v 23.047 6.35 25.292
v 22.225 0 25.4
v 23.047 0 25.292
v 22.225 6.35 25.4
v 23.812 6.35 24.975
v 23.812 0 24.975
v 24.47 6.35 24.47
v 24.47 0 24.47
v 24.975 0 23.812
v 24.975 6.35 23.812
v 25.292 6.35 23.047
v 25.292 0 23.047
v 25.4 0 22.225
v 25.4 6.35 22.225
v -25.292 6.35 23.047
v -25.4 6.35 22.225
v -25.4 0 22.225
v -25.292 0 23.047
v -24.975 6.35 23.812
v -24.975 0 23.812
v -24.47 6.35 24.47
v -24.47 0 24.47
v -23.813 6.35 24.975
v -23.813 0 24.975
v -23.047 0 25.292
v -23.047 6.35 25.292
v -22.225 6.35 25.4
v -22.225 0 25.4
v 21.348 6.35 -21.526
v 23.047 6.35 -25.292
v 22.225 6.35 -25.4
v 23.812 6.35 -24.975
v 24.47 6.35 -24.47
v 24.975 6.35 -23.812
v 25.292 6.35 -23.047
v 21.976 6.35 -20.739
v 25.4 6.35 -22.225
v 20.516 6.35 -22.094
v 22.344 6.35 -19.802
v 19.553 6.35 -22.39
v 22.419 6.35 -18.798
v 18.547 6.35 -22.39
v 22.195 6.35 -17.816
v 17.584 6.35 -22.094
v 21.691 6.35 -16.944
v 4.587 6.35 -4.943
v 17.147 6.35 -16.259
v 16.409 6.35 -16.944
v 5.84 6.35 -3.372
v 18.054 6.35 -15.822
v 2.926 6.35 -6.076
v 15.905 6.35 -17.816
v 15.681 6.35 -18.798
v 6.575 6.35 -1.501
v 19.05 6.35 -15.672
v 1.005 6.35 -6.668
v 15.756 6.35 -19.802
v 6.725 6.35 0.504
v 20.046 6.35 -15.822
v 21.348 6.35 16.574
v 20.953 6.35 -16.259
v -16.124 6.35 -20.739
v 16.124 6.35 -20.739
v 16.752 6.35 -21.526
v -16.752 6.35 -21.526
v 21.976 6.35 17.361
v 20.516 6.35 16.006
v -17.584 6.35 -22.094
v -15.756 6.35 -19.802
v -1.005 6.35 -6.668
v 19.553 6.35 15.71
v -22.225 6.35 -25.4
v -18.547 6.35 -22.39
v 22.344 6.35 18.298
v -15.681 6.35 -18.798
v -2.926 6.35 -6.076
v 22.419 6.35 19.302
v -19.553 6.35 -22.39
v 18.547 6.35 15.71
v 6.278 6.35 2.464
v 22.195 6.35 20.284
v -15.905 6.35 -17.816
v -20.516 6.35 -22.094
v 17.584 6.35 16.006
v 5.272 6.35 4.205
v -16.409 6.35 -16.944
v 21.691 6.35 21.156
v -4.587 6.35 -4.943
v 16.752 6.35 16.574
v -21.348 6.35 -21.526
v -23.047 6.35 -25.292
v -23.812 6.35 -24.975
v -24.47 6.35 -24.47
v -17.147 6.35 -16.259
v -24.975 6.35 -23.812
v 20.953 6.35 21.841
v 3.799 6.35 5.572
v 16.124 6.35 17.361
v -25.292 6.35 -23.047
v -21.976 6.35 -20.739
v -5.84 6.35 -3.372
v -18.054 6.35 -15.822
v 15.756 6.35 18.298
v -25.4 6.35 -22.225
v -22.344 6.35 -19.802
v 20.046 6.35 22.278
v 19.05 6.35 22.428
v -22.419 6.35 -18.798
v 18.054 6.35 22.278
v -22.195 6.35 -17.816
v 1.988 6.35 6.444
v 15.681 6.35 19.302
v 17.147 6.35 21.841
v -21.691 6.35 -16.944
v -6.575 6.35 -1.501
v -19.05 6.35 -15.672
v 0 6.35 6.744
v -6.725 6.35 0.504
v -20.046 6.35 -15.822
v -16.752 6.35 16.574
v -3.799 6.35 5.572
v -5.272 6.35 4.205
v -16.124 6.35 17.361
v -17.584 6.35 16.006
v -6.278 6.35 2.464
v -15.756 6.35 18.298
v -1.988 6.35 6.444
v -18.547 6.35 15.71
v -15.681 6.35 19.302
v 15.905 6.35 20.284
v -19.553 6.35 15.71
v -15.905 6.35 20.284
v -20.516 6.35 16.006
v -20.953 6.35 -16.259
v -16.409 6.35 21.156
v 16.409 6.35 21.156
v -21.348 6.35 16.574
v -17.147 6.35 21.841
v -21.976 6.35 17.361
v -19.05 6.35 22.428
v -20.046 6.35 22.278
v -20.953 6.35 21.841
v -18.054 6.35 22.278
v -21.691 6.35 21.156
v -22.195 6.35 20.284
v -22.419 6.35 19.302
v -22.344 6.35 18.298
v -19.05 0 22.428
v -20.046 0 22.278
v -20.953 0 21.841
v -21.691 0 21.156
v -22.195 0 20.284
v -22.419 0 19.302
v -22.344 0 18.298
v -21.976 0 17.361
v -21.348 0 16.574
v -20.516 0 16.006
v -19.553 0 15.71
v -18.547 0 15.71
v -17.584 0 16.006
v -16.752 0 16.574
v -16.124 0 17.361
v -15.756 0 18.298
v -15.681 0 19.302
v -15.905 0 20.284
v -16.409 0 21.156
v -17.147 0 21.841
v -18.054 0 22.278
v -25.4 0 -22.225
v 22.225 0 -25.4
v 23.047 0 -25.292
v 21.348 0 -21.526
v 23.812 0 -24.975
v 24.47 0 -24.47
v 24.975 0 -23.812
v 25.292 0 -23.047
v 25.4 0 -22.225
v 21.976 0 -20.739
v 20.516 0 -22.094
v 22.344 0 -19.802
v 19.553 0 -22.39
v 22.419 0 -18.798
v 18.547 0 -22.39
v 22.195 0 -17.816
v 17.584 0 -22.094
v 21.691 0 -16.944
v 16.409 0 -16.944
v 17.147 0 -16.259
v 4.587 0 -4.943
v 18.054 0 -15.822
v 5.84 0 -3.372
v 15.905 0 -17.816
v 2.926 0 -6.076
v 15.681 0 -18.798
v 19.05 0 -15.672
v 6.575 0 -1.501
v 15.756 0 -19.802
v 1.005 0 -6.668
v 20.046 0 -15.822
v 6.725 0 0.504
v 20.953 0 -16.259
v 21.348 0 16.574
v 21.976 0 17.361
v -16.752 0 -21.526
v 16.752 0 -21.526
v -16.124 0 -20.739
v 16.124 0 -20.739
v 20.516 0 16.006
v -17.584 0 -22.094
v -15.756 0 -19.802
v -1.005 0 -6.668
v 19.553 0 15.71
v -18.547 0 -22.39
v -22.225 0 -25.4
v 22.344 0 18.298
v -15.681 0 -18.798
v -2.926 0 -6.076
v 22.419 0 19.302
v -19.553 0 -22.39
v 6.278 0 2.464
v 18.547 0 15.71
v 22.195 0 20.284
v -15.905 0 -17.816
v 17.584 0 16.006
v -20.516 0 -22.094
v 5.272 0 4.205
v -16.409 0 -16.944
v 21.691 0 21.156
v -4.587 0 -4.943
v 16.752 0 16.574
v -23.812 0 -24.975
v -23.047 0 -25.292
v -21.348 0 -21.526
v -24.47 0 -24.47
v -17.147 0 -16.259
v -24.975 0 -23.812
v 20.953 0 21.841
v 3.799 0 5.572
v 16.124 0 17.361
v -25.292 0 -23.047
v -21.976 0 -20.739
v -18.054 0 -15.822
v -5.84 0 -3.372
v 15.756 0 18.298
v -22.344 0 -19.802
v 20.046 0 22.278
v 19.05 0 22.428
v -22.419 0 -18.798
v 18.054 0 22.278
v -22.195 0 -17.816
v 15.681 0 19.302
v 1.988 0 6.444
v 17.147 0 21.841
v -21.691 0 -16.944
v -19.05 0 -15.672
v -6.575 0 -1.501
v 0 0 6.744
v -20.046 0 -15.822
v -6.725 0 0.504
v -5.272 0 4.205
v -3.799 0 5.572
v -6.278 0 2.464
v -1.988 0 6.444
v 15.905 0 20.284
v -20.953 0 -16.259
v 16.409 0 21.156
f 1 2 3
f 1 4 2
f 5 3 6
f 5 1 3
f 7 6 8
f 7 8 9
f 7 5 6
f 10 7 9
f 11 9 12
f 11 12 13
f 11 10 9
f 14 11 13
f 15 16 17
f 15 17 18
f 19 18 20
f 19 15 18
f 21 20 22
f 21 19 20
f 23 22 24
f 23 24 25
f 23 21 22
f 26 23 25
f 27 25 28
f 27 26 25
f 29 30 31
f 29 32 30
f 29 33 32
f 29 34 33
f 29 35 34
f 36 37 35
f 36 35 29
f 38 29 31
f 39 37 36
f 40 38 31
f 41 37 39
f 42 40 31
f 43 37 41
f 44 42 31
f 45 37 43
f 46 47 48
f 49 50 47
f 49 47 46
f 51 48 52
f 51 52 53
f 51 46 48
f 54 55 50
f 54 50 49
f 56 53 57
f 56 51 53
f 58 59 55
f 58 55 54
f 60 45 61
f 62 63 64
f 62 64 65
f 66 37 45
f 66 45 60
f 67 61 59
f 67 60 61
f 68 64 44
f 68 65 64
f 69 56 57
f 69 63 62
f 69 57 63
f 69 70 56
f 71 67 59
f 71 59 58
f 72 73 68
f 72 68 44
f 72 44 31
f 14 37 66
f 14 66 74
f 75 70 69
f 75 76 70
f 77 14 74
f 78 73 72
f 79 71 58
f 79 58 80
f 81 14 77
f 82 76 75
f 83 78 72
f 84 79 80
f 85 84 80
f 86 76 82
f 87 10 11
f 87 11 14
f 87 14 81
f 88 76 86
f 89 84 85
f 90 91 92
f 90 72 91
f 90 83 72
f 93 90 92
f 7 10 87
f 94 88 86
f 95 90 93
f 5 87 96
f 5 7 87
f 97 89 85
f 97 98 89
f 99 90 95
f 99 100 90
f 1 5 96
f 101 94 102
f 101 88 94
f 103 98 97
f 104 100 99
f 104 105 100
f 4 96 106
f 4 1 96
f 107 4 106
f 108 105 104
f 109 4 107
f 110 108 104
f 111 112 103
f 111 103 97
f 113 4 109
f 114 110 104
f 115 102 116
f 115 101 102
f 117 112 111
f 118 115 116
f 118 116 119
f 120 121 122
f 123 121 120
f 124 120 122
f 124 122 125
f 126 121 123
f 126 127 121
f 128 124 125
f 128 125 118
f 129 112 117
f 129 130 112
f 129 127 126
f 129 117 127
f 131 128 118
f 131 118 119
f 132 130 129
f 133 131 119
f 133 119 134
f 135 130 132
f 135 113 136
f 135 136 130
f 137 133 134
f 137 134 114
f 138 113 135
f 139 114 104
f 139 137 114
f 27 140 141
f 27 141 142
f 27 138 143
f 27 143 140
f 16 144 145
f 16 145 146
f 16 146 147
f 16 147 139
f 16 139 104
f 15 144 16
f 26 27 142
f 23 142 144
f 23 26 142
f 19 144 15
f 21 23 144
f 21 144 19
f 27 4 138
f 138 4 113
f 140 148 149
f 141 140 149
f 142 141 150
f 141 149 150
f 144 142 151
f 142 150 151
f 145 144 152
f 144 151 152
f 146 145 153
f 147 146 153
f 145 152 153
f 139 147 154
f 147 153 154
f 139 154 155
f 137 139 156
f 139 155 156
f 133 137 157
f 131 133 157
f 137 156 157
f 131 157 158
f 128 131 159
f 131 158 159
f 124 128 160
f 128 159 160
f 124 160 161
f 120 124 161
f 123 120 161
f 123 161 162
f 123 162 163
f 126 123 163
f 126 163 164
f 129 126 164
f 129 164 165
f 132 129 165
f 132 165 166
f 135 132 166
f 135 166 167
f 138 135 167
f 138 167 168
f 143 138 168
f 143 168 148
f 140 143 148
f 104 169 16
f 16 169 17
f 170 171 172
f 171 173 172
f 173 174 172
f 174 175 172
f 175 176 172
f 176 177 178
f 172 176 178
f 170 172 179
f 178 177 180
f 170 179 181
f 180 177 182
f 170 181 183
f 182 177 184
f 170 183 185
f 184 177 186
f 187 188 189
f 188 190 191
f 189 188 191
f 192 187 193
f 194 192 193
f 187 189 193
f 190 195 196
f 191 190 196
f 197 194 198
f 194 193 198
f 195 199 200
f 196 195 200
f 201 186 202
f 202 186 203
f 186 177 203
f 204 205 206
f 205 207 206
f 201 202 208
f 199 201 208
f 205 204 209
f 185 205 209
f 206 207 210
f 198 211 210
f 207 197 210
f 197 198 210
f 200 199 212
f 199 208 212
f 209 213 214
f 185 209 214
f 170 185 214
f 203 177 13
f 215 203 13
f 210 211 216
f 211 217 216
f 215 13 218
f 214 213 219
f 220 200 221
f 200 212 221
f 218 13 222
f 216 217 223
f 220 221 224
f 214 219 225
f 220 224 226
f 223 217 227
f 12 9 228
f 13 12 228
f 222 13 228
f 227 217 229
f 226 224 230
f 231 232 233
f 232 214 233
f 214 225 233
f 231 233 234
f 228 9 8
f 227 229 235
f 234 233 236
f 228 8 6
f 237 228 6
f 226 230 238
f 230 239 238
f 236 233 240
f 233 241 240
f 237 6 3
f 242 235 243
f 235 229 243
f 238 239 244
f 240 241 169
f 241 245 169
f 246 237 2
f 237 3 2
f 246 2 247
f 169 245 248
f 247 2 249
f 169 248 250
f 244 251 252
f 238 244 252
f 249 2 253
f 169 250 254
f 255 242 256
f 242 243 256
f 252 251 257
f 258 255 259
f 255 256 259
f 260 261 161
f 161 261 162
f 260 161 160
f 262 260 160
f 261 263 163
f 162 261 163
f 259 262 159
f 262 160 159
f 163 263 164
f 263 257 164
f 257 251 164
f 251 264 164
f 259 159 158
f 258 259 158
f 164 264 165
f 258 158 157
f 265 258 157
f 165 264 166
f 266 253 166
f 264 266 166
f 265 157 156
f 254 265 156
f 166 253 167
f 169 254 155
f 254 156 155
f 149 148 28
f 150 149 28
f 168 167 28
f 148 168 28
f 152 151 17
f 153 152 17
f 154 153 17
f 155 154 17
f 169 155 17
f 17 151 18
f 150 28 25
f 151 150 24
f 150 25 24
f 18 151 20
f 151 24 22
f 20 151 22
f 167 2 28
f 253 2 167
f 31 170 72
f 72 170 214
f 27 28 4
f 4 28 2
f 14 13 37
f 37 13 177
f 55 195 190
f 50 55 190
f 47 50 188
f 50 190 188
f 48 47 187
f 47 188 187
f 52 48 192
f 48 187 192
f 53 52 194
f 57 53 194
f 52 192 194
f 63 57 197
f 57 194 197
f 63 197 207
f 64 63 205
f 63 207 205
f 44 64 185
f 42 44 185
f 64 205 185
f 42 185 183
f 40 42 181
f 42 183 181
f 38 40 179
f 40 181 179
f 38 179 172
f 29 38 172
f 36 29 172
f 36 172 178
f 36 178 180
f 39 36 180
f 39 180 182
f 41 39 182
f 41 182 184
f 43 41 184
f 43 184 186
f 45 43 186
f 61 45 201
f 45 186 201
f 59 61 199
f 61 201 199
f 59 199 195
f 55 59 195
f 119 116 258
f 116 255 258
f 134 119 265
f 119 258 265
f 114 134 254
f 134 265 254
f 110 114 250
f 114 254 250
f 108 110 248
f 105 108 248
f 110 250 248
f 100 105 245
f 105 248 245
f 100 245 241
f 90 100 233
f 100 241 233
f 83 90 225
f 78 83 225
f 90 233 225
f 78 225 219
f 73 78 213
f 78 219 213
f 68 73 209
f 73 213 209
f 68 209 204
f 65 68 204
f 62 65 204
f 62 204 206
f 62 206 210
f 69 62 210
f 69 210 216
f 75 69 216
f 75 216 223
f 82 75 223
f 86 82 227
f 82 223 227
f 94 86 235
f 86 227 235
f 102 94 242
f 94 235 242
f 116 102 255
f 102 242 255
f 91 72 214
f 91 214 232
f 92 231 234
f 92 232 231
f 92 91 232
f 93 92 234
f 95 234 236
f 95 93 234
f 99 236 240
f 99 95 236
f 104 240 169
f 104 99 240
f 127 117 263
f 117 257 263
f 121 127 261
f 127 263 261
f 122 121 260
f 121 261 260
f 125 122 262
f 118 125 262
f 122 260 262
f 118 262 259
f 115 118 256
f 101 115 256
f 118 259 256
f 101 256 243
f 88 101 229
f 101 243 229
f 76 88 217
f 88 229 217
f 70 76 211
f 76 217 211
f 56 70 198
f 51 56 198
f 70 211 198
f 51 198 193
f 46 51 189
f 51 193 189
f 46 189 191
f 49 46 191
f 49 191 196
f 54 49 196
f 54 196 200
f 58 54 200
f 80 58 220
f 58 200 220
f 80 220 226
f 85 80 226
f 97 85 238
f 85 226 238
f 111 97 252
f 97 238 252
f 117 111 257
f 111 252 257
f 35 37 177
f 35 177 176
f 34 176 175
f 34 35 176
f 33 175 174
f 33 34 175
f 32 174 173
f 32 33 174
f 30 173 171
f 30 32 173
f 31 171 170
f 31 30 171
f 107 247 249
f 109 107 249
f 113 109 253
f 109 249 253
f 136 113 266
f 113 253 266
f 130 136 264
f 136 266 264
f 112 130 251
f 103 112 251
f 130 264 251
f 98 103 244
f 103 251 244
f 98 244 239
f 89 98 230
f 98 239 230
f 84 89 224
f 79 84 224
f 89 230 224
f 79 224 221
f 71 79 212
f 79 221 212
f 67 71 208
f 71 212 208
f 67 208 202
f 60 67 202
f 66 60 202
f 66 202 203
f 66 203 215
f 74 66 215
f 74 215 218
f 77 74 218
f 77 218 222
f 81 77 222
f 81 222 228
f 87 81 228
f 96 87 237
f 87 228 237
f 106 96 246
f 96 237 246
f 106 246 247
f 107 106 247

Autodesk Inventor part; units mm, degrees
ref_plane "YZ Plane" through (0, 0, 0) normal (1, 0, 0) x (0, 1, 0)
ref_plane "XZ Plane" through (0, 0, 0) normal (0, 1, 0) x (-1, 0, 0)
ref_plane "XY Plane" through (0, 0, 0) normal (0, 0, 1) x (1, 0, 0)
sketch "Sketch1" plane through (0, 0, 0) normal (0, 1, 0) x (-1, 0, 0)
  line L0 (25.4, 25.4) -> (-25.4, 25.4)
  line L1 (-25.4, 25.4) -> (-25.4, -25.4)
  line L2 (-25.4, -25.4) -> (25.4, -25.4)
  line L3 (25.4, -25.4) -> (25.4, 25.4)
  point P0 (0, 0)
  dimension "d0" = 50.8
  dimension "d1" = 50.8
  dimension "d2" = 25.4
  dimension "d3" = 25.4
extrude "Extrusion1" add sketch "Sketch1" along normal blind 6.35
sketch "Sketch2" plane through (0, 6.35, 0) normal (0, 1, 0) x (1, 0, 0)
  point P0 (0, 0)
  point P1 (-19.05, -19.05)
  point P2 (-19.05, 19.05)
  point P3 (19.05, 19.05)
  point P4 (19.05, -19.05)
  dimension "d6" = 38.1
  dimension "d7" = 38.1
  dimension "d8" = 19.05
  dimension "d9" = 19.05
hole "Hole1" at (-19.05, 6.35, 19.05) at (-19.05, 6.35, -19.05) at (19.05, 6.35, -19.05) at (19.05, 6.35, 19.05) direction (0, -1, 0) diameter 6.7564 end through all clearance for "Flat Head Machine Screw (82)" size "1/4" standard "Ansi Unified Screw Threads"
fillet "Fillet1" radius 3.175 4 edges at (-25.4, 3.175, 25.4) (-25.4, 3.175, -25.4) (25.4, 3.175, -25.4) (25.4, 3.175, 25.4)
sketch "Sketch3" plane through (0, 6.35, 0) normal (0, 1, 0) x (1, 0, 0)
  point P0 (0, 0)
  point P1 (0, 0)
hole "Hole2" at (0, 6.35, 0) direction (0, -1, 0) diameter 13.4874 end through all clearance for "Flat Head Machine Screw (82)" size "1/2" standard "Ansi Unified Screw Threads"
properties part number "Motor_Shaft_Attachment"
